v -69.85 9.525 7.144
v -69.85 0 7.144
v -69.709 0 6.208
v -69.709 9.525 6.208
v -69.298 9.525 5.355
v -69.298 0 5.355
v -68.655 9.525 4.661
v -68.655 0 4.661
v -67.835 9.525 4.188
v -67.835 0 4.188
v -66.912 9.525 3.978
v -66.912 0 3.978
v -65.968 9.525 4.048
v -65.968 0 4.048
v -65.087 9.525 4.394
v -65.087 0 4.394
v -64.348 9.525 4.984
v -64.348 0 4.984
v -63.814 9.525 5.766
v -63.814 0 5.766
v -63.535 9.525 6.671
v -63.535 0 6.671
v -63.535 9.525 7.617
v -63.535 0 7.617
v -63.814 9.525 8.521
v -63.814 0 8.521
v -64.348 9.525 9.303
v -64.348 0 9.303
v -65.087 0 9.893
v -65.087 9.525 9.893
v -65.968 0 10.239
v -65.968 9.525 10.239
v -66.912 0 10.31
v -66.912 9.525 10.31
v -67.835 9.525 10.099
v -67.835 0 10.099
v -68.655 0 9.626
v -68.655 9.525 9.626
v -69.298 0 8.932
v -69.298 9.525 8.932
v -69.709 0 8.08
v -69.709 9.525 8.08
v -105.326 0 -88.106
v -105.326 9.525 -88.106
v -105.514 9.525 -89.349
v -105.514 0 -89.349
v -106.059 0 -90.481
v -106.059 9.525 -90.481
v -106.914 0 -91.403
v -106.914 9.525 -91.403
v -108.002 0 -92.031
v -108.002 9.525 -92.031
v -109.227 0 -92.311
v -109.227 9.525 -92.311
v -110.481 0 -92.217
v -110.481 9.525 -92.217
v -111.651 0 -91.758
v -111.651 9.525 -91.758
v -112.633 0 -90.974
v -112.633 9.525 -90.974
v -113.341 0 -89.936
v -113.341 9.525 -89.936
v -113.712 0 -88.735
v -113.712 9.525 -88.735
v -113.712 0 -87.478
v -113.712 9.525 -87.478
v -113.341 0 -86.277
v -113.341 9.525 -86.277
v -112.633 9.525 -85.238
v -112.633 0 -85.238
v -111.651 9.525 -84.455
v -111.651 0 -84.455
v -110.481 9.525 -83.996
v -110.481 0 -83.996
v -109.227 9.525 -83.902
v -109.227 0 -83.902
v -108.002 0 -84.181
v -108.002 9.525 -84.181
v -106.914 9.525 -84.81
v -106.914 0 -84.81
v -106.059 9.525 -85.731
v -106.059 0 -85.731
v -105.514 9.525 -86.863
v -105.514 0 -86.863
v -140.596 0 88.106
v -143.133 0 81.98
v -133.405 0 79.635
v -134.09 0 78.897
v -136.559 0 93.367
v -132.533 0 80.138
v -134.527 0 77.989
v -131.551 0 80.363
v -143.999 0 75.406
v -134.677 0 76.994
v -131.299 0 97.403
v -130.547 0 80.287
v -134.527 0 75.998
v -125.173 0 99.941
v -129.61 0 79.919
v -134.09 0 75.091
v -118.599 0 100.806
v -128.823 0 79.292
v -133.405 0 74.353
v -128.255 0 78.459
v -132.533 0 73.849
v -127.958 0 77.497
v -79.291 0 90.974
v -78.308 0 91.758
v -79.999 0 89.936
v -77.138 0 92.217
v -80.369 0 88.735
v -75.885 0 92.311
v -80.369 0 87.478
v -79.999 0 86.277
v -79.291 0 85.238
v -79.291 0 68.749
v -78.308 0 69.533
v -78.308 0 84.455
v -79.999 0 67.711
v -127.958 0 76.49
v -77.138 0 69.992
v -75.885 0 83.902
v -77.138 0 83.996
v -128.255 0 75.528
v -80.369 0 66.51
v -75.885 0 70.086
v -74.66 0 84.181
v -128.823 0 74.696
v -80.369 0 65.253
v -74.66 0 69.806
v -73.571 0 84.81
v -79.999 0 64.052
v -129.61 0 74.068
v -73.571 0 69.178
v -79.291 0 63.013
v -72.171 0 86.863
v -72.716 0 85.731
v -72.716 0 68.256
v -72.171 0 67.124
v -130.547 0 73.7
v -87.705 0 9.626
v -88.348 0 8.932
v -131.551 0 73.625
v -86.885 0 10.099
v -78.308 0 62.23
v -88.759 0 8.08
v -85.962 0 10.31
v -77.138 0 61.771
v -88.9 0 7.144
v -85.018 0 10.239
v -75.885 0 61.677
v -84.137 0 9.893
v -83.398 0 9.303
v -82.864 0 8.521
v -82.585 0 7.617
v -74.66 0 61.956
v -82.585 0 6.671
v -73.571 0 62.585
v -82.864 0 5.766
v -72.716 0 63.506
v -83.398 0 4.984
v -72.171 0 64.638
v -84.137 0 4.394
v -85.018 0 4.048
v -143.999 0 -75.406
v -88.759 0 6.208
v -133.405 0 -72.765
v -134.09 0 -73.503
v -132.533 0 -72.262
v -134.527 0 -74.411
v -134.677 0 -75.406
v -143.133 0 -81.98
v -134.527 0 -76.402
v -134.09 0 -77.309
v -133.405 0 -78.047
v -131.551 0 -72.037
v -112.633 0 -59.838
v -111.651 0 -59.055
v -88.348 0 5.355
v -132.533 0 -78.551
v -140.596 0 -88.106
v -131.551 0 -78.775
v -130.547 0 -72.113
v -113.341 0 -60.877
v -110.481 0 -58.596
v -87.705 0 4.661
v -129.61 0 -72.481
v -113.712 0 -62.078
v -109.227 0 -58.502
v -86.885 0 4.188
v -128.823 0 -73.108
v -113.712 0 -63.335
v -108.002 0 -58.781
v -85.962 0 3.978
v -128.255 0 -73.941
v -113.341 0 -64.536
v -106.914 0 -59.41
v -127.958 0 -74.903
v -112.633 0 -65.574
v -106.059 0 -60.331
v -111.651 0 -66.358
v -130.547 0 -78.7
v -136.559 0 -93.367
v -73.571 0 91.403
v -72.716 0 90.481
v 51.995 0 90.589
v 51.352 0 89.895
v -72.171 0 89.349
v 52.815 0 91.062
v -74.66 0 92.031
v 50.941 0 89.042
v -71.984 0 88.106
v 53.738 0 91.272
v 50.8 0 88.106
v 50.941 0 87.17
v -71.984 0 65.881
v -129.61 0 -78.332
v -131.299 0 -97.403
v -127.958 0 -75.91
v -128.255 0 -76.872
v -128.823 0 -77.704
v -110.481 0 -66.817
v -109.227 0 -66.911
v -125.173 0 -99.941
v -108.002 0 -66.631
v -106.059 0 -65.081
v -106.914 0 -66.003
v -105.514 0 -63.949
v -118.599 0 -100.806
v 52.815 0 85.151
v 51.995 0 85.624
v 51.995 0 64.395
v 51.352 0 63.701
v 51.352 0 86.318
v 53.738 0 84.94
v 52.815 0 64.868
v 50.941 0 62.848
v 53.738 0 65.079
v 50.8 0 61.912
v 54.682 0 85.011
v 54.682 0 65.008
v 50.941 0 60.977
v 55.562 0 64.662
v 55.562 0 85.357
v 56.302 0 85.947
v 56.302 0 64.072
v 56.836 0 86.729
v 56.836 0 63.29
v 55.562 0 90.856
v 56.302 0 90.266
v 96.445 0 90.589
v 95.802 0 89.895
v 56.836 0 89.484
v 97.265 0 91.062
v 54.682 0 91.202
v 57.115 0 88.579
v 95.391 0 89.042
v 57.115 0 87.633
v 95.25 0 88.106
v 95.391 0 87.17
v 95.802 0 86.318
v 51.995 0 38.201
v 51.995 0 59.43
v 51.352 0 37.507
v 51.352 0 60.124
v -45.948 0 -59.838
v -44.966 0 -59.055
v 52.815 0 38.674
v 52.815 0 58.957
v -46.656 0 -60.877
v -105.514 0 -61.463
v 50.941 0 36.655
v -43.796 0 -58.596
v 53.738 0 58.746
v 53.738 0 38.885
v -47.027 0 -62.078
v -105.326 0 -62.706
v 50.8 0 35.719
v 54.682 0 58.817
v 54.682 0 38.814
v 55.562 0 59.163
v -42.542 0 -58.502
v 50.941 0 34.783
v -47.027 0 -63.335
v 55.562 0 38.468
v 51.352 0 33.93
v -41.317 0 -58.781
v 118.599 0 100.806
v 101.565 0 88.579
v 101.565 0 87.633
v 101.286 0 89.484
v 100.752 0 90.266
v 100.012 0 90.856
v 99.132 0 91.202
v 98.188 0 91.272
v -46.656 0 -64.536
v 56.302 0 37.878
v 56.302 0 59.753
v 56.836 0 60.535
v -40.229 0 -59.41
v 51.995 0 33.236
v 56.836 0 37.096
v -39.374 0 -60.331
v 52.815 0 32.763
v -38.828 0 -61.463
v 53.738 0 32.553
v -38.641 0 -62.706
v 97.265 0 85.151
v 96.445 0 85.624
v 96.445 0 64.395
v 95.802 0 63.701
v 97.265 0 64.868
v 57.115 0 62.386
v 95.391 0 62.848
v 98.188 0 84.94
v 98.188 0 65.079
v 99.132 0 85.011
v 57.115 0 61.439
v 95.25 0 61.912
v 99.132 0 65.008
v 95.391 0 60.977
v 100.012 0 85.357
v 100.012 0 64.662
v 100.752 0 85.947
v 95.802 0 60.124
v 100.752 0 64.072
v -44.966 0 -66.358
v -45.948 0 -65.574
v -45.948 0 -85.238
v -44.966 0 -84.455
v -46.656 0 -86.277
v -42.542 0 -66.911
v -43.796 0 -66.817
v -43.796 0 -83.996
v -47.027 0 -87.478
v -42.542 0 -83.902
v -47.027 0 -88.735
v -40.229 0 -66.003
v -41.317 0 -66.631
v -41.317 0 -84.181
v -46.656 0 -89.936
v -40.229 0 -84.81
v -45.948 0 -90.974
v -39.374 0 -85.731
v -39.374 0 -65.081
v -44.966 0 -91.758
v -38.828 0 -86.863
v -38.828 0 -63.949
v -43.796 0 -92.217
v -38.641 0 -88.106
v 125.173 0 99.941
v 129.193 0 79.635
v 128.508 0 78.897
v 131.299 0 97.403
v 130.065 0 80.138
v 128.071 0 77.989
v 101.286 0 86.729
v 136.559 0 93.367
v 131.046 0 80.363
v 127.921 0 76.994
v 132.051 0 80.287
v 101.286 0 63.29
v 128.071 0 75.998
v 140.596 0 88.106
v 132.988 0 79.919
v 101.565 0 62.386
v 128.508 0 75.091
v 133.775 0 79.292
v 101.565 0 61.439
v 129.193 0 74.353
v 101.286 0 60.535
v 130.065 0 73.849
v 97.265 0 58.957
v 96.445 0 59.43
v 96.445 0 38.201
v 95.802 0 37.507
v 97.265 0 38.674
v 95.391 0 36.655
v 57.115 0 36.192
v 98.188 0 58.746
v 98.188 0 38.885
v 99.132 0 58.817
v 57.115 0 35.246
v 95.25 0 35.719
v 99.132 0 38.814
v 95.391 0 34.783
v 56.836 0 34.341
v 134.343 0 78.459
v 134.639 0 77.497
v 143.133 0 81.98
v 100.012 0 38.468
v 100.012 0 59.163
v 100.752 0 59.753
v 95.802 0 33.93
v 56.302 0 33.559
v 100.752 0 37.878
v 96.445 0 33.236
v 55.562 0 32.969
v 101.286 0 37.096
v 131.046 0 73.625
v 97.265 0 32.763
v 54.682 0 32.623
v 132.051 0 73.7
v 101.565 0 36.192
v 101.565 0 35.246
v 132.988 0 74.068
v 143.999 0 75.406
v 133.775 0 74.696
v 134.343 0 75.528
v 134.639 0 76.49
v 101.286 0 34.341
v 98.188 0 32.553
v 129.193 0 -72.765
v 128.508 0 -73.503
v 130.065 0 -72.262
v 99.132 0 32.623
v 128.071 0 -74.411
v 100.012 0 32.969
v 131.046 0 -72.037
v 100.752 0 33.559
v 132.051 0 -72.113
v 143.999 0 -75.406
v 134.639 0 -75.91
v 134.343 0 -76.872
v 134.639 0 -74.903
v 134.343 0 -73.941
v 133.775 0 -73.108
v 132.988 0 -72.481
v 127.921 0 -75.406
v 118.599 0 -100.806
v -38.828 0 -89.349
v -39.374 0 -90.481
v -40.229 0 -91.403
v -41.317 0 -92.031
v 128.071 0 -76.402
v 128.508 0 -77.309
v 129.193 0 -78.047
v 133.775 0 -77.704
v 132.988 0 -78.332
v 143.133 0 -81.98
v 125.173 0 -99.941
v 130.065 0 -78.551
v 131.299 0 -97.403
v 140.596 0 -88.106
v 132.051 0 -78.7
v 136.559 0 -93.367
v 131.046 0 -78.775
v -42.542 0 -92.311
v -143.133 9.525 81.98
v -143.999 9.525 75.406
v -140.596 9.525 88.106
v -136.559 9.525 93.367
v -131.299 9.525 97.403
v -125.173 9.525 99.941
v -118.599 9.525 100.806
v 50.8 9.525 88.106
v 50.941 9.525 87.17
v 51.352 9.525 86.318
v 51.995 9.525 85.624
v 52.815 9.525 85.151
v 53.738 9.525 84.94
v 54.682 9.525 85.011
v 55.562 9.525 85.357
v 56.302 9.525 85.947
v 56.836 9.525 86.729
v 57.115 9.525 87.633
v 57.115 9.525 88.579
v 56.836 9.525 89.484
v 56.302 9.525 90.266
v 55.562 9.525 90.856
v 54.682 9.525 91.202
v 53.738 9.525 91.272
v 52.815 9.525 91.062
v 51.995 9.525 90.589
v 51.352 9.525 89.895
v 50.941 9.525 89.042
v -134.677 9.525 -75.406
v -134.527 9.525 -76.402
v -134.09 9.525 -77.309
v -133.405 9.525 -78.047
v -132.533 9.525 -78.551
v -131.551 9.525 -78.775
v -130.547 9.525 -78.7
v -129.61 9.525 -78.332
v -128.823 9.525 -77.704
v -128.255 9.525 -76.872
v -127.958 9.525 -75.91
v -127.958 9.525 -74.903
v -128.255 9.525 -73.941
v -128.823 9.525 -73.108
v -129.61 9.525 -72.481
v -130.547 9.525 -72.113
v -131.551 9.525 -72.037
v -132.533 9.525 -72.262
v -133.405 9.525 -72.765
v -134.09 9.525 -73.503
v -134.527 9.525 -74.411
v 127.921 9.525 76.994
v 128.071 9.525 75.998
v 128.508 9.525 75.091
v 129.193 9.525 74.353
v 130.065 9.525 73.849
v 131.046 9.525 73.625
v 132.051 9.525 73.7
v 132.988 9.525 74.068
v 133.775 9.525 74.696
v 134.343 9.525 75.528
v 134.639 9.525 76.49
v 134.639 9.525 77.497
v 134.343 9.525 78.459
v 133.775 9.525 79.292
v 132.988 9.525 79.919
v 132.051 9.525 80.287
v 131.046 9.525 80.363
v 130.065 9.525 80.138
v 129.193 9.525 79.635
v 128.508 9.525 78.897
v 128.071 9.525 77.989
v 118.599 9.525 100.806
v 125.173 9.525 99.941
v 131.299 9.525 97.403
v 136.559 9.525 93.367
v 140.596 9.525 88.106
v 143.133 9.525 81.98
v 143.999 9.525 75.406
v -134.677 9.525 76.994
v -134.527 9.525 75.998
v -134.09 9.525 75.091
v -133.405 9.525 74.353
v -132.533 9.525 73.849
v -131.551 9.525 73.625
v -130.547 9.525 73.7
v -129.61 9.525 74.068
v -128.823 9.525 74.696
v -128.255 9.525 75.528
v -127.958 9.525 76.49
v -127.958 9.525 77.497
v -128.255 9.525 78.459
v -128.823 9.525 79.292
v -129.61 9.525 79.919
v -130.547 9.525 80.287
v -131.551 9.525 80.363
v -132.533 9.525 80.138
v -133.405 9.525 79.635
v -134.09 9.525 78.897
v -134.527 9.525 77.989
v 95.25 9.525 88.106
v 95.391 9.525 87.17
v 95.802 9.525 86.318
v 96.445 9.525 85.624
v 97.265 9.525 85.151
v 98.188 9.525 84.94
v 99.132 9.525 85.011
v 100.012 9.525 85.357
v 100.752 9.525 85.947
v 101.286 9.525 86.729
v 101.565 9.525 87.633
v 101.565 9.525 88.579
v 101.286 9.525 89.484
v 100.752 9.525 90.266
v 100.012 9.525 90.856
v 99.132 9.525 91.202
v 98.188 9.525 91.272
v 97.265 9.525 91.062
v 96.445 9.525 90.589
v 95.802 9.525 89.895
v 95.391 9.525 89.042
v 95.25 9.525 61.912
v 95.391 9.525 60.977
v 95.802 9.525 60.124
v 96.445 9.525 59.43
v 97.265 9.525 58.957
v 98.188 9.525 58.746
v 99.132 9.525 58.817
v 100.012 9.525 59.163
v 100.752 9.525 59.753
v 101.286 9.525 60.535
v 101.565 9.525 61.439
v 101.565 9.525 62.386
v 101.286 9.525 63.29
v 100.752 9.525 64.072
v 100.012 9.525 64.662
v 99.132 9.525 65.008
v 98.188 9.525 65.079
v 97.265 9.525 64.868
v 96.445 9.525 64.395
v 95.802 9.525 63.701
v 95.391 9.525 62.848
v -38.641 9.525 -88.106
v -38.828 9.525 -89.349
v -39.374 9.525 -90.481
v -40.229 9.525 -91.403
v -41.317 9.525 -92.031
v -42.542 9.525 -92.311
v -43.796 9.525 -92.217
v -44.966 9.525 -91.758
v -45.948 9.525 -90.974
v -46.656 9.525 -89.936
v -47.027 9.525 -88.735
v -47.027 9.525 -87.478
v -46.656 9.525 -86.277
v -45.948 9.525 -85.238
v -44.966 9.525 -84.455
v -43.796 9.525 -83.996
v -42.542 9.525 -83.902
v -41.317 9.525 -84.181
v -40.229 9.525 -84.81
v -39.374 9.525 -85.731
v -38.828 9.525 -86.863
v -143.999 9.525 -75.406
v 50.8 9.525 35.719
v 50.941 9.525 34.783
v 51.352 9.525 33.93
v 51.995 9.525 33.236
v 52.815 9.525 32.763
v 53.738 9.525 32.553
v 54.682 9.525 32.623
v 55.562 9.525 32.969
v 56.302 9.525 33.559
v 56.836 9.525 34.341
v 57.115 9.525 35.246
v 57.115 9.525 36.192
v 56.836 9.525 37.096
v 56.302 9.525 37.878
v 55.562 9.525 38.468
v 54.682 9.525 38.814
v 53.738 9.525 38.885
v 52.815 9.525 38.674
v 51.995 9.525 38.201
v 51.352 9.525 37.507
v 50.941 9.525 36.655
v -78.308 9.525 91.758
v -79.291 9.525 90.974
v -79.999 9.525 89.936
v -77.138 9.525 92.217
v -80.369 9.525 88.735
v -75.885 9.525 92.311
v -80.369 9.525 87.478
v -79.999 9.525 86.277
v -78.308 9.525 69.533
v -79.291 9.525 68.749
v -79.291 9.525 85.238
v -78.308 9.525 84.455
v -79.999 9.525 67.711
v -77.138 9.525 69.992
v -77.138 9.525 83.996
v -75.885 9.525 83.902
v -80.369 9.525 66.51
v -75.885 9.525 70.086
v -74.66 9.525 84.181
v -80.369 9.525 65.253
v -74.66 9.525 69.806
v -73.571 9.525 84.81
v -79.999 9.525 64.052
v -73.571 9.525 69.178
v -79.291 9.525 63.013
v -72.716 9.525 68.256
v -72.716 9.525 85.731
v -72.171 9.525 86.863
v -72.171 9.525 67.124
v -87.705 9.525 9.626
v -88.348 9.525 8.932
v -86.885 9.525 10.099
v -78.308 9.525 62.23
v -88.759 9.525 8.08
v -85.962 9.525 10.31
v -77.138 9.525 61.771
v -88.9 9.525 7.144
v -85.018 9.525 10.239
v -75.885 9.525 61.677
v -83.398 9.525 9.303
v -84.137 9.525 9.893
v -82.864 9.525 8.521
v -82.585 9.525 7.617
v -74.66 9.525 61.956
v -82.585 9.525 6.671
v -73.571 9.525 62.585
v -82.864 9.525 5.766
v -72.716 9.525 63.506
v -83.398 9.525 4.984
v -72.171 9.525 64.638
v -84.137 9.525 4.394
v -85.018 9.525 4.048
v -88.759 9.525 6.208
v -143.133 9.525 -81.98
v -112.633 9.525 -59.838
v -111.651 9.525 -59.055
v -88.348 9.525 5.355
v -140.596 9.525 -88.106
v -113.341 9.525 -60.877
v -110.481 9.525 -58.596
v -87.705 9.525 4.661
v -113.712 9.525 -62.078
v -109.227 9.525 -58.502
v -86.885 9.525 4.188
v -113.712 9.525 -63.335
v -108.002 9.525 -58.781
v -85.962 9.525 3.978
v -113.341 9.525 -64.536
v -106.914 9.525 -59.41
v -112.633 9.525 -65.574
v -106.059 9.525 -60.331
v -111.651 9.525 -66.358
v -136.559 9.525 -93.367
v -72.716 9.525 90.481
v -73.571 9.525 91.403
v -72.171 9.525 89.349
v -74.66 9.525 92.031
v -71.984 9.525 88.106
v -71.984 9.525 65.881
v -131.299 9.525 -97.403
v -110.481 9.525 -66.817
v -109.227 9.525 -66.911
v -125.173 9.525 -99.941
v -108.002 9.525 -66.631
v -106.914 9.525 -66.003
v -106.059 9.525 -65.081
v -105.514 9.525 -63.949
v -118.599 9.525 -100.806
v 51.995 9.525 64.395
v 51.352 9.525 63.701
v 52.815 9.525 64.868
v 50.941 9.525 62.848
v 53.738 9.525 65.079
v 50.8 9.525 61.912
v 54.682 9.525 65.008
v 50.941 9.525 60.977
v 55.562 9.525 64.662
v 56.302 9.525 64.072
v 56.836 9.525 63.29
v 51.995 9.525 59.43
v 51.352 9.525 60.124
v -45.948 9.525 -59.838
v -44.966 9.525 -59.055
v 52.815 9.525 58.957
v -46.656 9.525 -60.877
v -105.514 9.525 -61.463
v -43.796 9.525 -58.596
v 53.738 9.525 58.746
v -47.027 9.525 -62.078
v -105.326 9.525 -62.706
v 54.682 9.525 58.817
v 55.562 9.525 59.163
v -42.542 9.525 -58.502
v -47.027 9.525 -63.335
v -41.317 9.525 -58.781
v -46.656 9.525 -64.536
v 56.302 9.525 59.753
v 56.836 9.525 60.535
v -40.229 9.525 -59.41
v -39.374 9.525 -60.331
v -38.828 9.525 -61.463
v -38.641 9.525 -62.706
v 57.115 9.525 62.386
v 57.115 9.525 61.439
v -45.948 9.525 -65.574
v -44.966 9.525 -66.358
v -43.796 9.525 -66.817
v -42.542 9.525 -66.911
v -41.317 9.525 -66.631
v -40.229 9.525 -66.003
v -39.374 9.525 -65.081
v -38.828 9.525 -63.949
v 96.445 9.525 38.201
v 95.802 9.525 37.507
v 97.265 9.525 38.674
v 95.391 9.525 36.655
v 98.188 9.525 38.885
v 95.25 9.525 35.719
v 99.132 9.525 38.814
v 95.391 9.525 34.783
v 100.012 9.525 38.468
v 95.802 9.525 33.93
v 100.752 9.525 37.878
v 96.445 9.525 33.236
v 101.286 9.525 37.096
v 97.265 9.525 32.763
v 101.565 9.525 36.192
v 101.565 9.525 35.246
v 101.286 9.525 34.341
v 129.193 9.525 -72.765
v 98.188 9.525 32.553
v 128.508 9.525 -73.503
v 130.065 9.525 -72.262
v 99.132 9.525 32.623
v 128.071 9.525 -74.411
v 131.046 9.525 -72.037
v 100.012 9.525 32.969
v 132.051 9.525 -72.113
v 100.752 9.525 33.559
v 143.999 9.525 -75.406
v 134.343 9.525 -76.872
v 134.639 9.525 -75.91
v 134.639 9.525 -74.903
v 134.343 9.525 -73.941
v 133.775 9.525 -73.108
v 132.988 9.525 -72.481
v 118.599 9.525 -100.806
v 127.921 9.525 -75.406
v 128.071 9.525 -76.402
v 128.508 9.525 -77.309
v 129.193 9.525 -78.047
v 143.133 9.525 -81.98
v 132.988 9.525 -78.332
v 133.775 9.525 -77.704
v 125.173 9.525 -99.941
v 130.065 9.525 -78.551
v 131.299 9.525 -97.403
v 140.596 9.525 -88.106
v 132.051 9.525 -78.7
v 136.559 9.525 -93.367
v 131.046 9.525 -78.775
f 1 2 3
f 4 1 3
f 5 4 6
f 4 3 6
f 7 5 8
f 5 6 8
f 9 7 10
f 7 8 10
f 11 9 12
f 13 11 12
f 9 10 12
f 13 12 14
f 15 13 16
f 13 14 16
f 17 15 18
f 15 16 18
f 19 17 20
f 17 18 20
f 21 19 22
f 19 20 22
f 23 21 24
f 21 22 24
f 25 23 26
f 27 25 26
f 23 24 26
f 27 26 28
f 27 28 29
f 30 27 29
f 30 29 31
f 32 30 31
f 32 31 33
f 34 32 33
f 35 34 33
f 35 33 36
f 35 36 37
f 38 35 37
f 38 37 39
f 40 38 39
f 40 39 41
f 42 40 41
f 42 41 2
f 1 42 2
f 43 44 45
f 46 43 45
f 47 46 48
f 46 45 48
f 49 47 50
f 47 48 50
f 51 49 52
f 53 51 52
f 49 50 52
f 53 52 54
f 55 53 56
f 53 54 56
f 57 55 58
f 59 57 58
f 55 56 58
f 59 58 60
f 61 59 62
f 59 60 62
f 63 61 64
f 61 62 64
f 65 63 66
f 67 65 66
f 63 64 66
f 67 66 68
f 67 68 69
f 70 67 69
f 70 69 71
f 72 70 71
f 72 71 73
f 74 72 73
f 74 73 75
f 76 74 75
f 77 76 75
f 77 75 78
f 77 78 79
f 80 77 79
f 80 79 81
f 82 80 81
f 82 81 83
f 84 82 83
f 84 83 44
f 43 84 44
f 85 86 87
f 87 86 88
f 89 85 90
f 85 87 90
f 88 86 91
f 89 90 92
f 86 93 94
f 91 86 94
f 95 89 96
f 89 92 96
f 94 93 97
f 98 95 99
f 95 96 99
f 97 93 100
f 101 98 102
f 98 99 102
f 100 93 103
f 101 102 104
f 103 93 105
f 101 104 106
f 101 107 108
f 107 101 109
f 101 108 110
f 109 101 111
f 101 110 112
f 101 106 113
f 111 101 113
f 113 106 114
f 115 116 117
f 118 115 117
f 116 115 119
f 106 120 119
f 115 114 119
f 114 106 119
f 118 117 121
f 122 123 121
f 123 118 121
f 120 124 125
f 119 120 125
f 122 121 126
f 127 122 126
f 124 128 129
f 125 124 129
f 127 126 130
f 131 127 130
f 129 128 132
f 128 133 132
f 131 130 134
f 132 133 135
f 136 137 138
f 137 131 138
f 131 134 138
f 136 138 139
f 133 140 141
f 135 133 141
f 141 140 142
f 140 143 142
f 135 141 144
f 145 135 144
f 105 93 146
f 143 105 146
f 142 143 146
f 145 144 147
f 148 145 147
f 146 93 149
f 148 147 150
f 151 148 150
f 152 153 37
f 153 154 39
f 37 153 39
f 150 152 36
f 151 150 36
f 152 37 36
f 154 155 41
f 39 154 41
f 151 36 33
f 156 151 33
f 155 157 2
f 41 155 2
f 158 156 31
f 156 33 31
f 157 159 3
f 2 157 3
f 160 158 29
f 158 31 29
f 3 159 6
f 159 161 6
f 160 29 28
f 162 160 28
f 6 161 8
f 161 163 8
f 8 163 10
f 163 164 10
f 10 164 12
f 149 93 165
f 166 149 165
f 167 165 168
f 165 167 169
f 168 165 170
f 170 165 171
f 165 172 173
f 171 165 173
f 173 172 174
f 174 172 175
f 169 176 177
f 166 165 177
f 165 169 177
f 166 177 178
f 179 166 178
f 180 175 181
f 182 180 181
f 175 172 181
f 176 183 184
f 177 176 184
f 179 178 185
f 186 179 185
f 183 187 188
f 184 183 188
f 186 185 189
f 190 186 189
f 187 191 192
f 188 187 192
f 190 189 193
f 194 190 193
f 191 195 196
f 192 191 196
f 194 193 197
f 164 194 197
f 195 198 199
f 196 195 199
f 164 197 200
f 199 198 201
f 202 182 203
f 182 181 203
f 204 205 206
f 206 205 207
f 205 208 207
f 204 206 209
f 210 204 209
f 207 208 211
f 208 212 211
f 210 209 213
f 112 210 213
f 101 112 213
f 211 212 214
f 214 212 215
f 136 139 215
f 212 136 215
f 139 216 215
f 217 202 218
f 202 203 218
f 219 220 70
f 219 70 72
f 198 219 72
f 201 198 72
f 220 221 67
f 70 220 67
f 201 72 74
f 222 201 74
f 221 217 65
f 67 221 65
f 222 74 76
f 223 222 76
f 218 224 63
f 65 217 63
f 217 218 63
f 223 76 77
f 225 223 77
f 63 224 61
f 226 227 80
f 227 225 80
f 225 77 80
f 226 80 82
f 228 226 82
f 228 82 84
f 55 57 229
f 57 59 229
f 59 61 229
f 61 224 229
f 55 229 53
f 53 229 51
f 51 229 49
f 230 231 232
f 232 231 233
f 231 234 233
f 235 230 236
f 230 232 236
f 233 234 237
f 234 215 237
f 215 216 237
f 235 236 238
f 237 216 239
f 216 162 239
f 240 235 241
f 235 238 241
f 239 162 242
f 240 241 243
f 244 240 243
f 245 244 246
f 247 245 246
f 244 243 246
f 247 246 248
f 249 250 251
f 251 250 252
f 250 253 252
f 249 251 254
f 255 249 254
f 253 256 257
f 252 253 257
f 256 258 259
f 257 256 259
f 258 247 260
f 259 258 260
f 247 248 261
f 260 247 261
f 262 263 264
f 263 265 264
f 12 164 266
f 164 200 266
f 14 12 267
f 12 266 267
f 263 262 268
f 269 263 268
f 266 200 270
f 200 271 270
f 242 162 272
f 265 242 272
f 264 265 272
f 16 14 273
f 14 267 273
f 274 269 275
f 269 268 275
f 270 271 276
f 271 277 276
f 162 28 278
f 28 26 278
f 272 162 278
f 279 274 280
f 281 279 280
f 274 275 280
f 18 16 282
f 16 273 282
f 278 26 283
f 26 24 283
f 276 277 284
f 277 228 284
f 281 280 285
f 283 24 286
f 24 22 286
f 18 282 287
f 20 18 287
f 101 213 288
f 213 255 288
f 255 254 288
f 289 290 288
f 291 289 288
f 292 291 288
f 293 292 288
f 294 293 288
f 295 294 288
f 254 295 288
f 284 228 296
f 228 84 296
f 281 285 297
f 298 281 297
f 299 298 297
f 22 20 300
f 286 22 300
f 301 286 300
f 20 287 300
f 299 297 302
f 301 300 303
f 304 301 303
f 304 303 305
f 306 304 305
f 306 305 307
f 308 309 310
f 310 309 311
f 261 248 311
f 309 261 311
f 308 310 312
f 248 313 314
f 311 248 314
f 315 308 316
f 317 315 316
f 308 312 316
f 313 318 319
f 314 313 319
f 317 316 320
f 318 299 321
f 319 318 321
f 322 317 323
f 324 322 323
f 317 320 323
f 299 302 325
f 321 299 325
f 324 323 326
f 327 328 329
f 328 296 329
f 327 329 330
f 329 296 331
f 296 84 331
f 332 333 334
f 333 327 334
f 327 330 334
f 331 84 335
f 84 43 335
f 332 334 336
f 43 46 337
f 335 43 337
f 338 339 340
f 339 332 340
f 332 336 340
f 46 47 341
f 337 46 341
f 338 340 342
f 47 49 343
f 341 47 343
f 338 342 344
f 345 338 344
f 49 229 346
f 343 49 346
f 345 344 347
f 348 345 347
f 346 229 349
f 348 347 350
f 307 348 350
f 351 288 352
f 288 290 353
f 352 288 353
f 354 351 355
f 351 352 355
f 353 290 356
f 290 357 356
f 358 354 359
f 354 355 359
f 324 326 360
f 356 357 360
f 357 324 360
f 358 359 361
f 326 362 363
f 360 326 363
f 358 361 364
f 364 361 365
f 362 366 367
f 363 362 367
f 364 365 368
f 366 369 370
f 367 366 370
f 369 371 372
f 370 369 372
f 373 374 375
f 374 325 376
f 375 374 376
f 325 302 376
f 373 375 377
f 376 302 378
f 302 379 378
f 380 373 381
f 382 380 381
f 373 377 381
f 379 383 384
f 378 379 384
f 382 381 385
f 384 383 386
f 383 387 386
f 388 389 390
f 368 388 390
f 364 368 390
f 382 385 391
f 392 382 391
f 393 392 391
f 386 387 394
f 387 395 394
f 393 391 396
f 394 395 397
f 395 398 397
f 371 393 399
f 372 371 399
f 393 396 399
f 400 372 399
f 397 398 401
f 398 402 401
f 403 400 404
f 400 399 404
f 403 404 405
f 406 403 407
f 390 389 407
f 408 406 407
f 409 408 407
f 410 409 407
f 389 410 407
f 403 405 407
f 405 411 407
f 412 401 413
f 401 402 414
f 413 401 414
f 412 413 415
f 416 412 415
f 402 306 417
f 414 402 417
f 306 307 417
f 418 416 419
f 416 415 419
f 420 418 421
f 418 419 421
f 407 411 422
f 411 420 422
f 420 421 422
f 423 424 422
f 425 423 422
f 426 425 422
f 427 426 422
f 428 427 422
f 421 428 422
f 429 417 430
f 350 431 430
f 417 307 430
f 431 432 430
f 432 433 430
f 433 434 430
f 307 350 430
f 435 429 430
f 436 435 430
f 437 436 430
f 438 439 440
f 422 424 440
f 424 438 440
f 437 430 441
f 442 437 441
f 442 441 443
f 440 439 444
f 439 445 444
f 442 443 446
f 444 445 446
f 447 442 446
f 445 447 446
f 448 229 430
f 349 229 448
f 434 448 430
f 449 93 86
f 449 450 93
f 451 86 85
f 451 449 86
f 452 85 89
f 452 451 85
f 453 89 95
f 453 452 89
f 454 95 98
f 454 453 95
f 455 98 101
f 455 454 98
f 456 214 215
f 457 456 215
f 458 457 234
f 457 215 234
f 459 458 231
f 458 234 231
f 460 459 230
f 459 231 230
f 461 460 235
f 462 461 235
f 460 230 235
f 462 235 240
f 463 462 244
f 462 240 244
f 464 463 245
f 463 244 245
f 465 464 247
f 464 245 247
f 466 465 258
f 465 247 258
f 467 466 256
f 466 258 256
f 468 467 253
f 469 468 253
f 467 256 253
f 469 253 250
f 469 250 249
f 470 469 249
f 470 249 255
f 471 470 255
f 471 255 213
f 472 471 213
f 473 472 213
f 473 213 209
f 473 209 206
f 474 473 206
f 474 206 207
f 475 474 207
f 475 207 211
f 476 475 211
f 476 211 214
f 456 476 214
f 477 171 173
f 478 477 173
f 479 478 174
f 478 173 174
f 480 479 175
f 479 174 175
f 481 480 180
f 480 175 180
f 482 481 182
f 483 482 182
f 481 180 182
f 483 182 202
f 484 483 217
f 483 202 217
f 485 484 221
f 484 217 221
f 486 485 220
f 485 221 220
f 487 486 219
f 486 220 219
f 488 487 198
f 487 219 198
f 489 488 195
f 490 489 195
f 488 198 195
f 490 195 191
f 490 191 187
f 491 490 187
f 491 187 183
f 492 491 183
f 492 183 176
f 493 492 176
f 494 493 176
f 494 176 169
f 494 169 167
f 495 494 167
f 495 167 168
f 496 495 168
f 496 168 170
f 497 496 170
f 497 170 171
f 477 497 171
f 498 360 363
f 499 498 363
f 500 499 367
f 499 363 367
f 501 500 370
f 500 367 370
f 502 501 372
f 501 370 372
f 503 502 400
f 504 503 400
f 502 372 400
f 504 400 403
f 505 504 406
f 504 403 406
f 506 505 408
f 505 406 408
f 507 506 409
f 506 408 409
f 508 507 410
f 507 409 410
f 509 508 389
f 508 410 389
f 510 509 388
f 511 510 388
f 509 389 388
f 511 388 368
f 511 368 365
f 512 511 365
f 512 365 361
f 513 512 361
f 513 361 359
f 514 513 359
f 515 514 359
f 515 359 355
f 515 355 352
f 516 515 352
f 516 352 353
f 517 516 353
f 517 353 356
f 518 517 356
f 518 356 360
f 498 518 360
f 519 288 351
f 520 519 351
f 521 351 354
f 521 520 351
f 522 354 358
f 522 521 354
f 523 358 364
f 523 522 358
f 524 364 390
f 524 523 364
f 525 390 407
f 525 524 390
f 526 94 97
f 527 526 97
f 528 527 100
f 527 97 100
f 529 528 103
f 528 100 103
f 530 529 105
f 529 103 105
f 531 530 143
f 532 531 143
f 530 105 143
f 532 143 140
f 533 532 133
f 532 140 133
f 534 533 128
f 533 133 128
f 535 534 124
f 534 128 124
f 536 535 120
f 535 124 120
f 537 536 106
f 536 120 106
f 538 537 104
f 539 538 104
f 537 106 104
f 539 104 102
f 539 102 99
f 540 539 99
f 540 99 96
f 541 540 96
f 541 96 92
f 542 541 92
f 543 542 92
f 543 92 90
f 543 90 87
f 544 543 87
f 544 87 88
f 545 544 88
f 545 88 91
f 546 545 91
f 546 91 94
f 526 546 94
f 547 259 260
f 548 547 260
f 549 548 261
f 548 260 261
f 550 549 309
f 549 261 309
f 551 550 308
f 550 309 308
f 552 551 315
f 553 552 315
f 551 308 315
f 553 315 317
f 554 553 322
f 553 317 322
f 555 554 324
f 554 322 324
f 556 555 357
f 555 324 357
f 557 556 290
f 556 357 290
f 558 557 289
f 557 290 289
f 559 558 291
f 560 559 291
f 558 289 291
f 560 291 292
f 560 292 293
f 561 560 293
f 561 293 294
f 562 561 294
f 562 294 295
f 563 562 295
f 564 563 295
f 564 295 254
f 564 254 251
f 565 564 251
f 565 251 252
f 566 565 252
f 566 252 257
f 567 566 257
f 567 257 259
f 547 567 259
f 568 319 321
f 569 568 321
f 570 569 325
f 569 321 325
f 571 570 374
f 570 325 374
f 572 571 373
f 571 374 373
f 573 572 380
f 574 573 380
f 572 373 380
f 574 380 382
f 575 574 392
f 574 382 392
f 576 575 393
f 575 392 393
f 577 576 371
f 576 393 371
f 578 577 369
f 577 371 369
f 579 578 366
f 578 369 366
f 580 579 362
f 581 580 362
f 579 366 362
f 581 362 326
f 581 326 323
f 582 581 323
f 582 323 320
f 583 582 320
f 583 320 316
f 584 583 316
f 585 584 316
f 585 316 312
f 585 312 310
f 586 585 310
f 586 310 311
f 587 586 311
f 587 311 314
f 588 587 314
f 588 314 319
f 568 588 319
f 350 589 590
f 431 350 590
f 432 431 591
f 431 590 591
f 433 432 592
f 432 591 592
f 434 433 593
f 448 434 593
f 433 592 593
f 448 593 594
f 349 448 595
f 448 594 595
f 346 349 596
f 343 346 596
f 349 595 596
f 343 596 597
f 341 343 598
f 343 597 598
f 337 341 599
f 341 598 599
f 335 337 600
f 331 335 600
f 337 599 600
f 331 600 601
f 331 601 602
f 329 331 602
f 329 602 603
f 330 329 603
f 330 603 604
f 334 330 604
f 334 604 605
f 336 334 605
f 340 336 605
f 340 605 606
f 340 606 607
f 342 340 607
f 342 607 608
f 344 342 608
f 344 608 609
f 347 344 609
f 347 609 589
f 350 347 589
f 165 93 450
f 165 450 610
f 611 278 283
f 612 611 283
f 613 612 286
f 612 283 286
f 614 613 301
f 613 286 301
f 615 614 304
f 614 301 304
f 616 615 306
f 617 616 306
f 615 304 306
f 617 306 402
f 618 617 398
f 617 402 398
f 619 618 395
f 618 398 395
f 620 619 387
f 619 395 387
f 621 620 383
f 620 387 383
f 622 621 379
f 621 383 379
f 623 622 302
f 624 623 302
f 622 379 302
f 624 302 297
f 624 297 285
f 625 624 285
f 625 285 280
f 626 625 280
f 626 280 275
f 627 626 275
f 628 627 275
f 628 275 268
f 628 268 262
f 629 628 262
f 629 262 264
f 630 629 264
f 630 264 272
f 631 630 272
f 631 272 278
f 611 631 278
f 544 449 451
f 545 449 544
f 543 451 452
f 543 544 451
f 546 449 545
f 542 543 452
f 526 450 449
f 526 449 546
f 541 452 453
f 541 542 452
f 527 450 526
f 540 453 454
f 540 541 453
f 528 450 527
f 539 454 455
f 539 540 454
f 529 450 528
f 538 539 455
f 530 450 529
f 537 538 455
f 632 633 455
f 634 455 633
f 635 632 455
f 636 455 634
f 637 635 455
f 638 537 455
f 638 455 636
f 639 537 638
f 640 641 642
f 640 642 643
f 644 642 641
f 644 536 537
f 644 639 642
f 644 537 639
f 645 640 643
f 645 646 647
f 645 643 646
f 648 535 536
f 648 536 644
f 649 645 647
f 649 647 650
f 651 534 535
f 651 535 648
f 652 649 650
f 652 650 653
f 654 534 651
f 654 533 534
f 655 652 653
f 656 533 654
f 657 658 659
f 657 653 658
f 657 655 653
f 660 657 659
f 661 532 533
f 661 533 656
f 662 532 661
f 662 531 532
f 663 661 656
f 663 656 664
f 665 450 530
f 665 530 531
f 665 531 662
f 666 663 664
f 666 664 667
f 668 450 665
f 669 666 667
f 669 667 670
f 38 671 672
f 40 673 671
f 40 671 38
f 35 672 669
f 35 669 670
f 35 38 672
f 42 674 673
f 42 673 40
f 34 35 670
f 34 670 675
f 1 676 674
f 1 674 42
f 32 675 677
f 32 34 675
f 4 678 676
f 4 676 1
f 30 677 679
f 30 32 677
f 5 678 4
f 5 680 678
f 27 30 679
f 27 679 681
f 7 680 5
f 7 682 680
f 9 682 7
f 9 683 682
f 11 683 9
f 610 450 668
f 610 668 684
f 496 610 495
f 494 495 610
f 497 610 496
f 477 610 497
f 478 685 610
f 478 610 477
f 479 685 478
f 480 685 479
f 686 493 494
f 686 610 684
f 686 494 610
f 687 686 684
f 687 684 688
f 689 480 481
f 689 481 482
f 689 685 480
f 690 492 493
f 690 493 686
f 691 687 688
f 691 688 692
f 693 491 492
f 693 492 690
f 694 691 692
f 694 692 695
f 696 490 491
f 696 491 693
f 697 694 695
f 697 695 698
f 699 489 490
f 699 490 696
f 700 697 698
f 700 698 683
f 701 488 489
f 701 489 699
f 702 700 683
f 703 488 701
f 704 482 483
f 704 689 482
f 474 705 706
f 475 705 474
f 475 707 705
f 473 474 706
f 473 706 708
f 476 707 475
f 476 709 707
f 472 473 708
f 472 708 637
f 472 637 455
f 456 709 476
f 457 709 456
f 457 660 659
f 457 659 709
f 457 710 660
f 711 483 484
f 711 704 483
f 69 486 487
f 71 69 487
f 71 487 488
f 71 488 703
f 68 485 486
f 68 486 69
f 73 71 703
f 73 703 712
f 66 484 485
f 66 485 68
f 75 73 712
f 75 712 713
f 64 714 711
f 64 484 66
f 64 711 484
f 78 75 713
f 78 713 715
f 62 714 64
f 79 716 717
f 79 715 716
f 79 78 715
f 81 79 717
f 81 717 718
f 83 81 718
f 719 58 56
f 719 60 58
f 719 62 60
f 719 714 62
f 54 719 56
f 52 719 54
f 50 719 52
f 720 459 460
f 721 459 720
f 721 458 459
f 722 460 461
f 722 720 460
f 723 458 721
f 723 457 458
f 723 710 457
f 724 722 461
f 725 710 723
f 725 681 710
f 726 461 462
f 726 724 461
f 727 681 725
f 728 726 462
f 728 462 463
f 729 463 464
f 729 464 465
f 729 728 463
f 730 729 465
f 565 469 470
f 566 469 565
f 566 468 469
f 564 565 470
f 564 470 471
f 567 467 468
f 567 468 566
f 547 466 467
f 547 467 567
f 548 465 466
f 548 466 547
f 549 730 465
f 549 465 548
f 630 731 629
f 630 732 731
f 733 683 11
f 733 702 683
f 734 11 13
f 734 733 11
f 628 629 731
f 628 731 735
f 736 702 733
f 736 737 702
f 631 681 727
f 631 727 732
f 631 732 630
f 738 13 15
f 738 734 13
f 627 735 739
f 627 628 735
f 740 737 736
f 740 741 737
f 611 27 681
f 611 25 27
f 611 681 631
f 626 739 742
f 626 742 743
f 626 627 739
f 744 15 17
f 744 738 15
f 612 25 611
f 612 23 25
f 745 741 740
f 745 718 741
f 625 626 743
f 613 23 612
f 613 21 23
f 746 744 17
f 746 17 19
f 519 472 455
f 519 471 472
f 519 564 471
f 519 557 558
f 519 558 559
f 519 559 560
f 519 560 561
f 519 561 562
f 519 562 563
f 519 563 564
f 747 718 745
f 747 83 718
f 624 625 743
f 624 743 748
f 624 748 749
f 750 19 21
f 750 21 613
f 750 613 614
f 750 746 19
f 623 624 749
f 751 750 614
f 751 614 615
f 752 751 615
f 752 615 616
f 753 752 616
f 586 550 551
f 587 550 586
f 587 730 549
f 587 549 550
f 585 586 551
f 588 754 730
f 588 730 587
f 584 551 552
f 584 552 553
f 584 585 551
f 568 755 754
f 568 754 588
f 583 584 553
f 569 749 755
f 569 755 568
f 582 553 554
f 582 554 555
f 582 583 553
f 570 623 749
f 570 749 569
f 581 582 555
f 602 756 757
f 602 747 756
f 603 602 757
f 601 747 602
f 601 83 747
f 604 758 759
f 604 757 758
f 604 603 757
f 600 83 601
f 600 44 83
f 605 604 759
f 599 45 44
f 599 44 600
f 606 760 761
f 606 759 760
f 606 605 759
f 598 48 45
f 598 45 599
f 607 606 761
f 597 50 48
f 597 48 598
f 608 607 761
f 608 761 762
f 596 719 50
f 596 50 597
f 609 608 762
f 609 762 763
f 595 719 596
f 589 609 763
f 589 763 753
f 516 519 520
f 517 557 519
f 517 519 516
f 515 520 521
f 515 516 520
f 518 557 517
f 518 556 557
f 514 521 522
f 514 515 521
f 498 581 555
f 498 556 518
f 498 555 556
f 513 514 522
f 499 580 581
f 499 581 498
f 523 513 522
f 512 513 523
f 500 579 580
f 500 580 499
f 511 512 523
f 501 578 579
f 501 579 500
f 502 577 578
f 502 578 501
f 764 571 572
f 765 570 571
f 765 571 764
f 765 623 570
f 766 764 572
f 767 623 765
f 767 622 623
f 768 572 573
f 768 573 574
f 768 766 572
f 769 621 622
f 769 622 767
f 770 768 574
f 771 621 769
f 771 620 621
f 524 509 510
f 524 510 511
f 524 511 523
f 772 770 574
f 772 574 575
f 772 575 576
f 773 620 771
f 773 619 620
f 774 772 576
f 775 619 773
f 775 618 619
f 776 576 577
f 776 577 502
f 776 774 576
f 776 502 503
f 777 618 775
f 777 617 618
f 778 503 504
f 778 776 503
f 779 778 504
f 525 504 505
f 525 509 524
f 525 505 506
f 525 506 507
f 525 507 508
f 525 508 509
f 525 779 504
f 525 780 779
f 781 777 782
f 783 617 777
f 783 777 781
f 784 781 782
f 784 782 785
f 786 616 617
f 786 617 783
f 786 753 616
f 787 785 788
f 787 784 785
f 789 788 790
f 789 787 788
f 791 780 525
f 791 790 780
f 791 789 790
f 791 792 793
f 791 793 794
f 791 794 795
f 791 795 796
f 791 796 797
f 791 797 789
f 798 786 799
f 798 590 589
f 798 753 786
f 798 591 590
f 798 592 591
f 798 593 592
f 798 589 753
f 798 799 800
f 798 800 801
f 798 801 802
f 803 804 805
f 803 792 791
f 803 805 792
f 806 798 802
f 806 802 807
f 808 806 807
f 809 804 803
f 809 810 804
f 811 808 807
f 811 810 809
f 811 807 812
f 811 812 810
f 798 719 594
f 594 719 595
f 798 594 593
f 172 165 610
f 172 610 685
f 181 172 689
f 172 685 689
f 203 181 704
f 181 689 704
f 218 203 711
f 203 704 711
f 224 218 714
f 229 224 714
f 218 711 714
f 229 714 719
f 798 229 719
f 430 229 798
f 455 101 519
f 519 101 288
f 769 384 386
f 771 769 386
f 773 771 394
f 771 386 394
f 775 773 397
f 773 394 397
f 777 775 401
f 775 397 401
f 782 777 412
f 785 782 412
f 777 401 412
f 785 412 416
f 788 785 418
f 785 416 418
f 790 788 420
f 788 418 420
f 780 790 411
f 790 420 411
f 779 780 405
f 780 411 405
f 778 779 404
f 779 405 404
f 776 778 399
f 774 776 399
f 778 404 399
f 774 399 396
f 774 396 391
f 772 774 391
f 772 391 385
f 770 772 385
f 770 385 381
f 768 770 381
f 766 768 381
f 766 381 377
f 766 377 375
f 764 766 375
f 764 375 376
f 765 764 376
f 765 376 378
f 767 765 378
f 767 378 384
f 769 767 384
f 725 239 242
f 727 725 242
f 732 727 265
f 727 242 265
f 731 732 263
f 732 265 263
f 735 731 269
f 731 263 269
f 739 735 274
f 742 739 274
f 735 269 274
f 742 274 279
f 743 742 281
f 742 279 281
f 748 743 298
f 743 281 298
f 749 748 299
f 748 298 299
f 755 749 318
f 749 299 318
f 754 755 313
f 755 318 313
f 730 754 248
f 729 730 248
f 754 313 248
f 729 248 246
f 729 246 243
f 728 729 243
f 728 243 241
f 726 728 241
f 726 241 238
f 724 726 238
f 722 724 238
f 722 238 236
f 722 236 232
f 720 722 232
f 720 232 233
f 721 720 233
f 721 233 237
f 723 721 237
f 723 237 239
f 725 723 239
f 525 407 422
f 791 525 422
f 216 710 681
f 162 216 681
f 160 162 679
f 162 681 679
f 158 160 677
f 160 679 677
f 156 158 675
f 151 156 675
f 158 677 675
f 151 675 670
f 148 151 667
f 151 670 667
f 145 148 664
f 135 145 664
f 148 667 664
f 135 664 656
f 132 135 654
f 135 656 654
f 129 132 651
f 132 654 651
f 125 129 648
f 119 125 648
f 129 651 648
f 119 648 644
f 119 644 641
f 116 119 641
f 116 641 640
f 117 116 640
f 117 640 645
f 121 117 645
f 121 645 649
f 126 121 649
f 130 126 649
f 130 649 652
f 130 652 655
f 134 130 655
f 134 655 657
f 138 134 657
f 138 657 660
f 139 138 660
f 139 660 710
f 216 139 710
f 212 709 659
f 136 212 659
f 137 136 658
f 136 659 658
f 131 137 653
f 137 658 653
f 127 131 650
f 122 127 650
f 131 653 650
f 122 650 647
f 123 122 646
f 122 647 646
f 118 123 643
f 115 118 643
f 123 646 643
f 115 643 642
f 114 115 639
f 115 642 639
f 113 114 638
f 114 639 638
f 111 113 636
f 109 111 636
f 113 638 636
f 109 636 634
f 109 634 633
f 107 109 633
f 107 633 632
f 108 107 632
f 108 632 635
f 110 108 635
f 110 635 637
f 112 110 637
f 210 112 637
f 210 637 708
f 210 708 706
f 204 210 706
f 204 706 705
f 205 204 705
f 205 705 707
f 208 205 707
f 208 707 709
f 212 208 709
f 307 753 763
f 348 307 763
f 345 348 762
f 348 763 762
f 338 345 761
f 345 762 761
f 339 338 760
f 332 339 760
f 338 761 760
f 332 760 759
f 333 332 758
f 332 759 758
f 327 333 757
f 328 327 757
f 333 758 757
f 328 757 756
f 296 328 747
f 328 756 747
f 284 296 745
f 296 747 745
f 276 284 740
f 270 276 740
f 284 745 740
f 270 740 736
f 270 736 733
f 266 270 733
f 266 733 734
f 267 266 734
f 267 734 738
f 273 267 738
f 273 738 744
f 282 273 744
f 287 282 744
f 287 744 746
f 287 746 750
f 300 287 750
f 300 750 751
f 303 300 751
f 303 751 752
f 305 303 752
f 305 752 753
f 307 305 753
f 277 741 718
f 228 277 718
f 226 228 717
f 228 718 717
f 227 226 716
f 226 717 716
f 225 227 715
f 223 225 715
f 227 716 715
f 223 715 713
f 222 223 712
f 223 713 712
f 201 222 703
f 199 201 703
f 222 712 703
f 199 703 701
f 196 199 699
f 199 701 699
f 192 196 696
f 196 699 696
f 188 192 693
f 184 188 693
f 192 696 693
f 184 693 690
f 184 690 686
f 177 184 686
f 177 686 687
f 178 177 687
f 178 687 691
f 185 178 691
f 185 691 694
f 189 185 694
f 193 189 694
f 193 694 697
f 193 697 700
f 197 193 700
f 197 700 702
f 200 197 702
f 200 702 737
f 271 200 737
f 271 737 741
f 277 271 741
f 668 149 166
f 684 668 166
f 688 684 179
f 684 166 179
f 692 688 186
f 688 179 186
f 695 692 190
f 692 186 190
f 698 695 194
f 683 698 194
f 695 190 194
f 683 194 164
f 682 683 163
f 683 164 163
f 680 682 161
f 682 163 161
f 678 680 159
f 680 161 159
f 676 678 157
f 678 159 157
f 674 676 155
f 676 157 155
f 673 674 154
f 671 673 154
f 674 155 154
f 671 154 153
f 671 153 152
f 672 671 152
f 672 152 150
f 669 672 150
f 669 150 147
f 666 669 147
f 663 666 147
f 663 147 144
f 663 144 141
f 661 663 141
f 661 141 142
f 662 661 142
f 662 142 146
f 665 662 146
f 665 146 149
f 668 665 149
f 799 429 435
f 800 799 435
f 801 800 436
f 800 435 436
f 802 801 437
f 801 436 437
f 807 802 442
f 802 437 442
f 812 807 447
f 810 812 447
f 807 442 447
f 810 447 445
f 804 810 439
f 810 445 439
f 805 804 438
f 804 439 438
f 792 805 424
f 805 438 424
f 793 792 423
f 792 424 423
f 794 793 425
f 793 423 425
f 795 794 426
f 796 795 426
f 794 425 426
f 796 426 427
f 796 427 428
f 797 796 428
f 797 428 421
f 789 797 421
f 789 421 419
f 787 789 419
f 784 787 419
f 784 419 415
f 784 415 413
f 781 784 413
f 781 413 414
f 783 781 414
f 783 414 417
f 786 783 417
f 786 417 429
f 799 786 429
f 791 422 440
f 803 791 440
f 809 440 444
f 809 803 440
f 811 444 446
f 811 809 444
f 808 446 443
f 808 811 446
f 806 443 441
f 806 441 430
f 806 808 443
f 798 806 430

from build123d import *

# Parameters (mm, degrees)
SKETCH1_W                       = 287.9979
SKETCH1_H                       = 201.6125
BOSS_EXTRUDE1_DEPTH             = 9.525
FILLET2_R                       = 25.4
F_1_4_CLEARANCE_HOLE1_D         = 6.7564
F_1_4_CLEARANCE_HOLE1_DEPTH     = 21.59
F_1_4_CLEARANCE_HOLE1_TIP       = 2.029827343
F_5_16_CLEARANCE_HOLE1_D        = 8.4328
F_1_4_0_25_DIAMETER_HOLE2_D     = 6.35
F_1_4_0_25_DIAMETER_HOLE2_DEPTH = 21.59
F_1_4_0_25_DIAMETER_HOLE2_TIP   = 1.907732465


with BuildPart() as part:
    # Sketch1 → Boss-Extrude1 (new body)
    with BuildSketch(Plane(origin=(0, 0, 0), x_dir=(1, 0, 0), z_dir=(0, 1, 0))):
        Rectangle(SKETCH1_W, SKETCH1_H)
    extrude(amount=BOSS_EXTRUDE1_DEPTH)

    # Fillet2
    fillet2_edges = [part.edges().sort_by_distance(p)[0] for p in [
        (143.99895, 4.7625, 100.80625),
        (-143.99895, 4.7625, 100.80625),
        (-143.99895, 4.7625, -100.80625),
        (143.99895, 4.7625, -100.80625),
    ]]
    fillet(fillet2_edges, radius=FILLET2_R)

    # 1/4 Clearance Hole1
    with Locations(Plane(origin=(0, 9.525, 0), x_dir=(1, 0, 0), z_dir=(0, 1, 0))):
        with Locations((-131.29895, 75.40625), (131.29895, 75.40625), (131.29895, -76.99375), (-131.29895, -76.99375)):
            Hole(F_1_4_CLEARANCE_HOLE1_D / 2, depth=F_1_4_CLEARANCE_HOLE1_DEPTH)
            with Locations((0, 0, -(F_1_4_CLEARANCE_HOLE1_DEPTH + F_1_4_CLEARANCE_HOLE1_TIP / 2))):  # 118° drill point
                Cone(0, F_1_4_CLEARANCE_HOLE1_D / 2, F_1_4_CLEARANCE_HOLE1_TIP, mode=Mode.SUBTRACT)

    # 5/16 Clearance Hole1 (through all)
    with Locations(Plane(origin=(0, 0, 0), x_dir=(-1, 0, 0), z_dir=(0, -1, 0))):
        with Locations((76.2, -88.10625), (76.2, -65.88125), (42.857421778, 88.10625), (109.542578222, 62.70625), (42.857421778, 62.70625), (109.542578222, 88.10625)):
            Hole(F_5_16_CLEARANCE_HOLE1_D / 2)

    # 1/4 (0.25) Diameter Hole2
    with Locations(Plane(origin=(0, 9.525, 0), x_dir=(1, 0, 0), z_dir=(0, 1, 0))):
        with Locations((53.975, -35.71875), (98.425, -35.71875), (98.425, -61.9125), (98.425, -88.10625), (53.975, -88.10625), (53.975, -61.9125), (-66.675, -7.14375), (-85.725, -7.14375)):
            Hole(F_1_4_0_25_DIAMETER_HOLE2_D / 2, depth=F_1_4_0_25_DIAMETER_HOLE2_DEPTH)
            with Locations((0, 0, -(F_1_4_0_25_DIAMETER_HOLE2_DEPTH + F_1_4_0_25_DIAMETER_HOLE2_TIP / 2))):  # 118° drill point
                Cone(0, F_1_4_0_25_DIAMETER_HOLE2_D / 2, F_1_4_0_25_DIAMETER_HOLE2_TIP, mode=Mode.SUBTRACT)


solid = part.part
